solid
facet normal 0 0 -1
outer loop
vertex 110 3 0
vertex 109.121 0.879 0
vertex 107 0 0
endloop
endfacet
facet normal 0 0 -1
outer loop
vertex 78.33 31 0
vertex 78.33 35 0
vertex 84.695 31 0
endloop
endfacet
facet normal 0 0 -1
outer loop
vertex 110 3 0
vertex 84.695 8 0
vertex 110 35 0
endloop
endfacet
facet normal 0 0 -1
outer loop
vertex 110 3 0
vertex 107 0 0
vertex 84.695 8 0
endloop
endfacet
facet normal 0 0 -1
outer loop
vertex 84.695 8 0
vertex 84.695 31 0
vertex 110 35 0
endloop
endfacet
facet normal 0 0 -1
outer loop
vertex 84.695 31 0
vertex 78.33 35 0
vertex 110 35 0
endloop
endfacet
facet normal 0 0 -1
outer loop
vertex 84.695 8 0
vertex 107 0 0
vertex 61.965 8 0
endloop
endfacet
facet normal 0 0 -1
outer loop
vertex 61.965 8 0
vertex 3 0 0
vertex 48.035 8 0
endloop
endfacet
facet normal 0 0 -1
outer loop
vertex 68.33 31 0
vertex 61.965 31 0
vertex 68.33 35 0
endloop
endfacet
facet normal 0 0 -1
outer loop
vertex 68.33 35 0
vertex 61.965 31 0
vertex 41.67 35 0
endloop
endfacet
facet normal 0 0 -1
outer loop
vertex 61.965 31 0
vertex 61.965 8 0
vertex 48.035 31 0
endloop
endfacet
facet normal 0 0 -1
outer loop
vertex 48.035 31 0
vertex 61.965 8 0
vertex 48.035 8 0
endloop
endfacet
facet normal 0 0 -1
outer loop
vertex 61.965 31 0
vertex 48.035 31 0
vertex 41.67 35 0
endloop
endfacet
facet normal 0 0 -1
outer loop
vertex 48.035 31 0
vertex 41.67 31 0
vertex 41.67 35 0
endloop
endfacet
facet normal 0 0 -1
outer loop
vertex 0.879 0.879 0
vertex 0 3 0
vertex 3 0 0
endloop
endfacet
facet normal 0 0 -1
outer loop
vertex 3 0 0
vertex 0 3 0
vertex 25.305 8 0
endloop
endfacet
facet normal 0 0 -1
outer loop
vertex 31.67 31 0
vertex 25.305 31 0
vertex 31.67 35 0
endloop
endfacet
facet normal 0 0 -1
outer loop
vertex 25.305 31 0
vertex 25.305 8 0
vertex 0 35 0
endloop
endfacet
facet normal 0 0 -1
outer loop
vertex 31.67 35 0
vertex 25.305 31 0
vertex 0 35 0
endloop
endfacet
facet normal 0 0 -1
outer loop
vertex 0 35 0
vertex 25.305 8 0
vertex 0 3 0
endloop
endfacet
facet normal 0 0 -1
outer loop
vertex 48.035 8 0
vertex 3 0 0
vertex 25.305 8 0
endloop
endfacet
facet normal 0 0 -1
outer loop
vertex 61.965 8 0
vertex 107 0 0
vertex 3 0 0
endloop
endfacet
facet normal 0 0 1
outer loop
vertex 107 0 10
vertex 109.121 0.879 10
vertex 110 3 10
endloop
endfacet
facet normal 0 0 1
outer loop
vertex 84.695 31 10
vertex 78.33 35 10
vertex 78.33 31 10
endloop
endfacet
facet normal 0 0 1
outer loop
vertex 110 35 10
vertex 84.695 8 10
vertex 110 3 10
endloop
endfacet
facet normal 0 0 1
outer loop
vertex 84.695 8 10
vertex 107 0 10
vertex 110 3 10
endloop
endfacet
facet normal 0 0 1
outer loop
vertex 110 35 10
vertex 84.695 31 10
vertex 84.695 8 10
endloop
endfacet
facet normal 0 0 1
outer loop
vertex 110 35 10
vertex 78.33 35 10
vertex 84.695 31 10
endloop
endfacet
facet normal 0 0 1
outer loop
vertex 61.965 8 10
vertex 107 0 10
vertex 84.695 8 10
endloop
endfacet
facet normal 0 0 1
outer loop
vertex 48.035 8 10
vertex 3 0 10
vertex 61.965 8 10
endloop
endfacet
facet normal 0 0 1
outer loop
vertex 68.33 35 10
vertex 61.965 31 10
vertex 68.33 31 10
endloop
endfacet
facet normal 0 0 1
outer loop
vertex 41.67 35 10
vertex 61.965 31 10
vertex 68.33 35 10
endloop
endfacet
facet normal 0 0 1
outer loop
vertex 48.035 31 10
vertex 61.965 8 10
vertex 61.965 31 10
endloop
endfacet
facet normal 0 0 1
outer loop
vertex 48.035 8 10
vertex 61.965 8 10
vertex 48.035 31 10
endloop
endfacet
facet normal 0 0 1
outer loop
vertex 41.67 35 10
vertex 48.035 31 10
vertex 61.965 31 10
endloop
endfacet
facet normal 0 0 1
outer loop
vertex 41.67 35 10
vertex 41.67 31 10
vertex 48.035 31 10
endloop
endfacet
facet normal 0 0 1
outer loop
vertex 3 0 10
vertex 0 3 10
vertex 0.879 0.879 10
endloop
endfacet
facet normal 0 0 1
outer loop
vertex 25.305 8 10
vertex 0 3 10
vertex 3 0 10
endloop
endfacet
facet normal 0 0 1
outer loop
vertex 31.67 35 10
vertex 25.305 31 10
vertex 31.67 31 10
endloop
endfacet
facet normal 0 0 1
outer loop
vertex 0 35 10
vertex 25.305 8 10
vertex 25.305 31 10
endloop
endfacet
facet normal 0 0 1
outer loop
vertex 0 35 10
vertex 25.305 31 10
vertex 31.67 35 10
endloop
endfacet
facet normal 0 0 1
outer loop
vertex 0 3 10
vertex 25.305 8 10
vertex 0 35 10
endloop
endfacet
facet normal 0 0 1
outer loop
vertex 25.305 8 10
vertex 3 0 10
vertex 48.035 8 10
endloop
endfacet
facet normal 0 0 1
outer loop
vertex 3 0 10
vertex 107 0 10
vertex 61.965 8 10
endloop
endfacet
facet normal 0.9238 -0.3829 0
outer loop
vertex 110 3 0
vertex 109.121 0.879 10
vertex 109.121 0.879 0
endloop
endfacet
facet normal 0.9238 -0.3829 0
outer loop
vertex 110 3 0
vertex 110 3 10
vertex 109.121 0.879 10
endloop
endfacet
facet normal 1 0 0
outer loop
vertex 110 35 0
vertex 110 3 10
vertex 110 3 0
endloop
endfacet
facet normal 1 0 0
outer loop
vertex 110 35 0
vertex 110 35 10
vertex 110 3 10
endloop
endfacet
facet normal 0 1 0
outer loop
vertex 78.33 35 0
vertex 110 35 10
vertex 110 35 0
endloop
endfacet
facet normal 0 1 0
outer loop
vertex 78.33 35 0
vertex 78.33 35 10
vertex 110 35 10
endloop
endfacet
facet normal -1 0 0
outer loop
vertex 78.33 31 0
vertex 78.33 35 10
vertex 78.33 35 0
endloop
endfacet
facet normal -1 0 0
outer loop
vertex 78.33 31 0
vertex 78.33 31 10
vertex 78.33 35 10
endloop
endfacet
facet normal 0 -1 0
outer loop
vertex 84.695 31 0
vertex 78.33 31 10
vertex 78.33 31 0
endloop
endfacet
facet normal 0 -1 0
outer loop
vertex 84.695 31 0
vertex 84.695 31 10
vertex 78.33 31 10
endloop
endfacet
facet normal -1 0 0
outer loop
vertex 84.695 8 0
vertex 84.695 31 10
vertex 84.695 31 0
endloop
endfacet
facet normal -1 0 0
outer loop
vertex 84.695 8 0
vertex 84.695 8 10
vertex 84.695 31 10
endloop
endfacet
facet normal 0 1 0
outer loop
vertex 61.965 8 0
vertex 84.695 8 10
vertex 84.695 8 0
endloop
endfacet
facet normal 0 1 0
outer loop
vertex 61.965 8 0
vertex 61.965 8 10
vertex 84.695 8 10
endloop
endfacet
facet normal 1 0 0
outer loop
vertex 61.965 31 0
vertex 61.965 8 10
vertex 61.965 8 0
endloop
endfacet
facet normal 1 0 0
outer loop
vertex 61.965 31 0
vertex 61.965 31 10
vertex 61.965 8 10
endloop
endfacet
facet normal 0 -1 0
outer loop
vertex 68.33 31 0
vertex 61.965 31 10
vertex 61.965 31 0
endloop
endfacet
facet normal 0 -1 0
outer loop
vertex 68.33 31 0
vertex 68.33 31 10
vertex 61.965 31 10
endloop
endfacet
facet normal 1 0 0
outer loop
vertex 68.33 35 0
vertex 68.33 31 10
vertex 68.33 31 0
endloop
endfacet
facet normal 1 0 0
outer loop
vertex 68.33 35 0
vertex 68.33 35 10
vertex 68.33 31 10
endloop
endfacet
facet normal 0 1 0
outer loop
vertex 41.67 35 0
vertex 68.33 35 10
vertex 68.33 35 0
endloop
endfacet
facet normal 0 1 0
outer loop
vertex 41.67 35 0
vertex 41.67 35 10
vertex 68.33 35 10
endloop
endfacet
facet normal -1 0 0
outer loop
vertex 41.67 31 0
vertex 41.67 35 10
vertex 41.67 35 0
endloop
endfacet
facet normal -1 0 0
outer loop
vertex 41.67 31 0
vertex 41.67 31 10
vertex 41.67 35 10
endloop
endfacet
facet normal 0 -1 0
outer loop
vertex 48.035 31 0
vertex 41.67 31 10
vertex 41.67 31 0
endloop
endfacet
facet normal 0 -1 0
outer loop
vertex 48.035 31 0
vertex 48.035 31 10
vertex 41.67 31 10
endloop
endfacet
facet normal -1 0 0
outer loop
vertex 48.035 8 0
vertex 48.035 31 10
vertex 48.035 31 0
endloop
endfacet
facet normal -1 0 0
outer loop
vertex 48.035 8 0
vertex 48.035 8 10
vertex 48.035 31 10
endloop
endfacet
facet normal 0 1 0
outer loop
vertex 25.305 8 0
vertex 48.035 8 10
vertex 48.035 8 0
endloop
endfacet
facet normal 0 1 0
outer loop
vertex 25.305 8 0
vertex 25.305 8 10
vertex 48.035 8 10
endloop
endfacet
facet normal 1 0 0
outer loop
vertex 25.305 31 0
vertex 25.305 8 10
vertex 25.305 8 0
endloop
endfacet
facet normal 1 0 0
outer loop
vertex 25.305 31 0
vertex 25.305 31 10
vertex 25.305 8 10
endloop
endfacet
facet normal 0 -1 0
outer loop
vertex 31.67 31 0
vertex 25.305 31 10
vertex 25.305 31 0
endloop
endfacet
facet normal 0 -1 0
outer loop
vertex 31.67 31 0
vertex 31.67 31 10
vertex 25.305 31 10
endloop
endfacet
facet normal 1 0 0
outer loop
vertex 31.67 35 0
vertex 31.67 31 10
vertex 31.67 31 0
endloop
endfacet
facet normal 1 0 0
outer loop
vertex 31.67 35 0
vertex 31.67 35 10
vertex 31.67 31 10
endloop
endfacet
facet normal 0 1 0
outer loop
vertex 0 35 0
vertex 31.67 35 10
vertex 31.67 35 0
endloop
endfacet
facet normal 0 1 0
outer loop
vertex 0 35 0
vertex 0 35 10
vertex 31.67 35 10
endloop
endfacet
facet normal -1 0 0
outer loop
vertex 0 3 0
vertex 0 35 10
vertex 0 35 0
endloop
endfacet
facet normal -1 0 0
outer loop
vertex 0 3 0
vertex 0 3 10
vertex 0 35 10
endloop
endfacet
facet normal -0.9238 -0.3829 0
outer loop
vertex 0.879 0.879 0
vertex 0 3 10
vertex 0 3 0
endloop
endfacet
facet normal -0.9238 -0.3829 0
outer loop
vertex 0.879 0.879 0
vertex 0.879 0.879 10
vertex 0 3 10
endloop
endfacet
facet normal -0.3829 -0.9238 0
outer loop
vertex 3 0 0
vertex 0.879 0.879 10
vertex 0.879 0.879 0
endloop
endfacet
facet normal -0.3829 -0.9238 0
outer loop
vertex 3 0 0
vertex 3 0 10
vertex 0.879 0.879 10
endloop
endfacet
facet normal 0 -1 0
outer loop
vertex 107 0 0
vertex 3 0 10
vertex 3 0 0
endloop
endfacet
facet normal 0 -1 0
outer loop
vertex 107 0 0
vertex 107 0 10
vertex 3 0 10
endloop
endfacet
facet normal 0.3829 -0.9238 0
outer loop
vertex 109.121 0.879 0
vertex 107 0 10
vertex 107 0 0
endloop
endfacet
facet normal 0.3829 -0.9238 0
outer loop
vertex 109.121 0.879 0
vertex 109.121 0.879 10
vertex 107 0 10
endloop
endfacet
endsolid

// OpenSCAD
$fn = 32;

// ----------------------------------------------------------------------
// Window plate: 110 x 35 mm, 2 open windows
// ----------------------------------------------------------------------

// --- parameters (mm) ---
profile_height = 10;      // extrusion height
profile_points = 24;      // points of the closed outline

profile = [[0, 3], [0.879, 0.879], [3, 0], [107, 0], [109.121, 0.879], [110, 3], [110, 35], [78.33, 35], [78.33, 31], [84.695, 31], [84.695, 8], [61.965, 8], [61.965, 31], [68.33, 31], [68.33, 35], [41.67, 35], [41.67, 31], [48.035, 31], [48.035, 8], [25.305, 8], [25.305, 31], [31.67, 31], [31.67, 35], [0, 35]];  // single closed polygon, 24 points, counter clockwise

// --- the one profile operation ---
linear_extrude(height = profile_height) polygon(points = profile);
